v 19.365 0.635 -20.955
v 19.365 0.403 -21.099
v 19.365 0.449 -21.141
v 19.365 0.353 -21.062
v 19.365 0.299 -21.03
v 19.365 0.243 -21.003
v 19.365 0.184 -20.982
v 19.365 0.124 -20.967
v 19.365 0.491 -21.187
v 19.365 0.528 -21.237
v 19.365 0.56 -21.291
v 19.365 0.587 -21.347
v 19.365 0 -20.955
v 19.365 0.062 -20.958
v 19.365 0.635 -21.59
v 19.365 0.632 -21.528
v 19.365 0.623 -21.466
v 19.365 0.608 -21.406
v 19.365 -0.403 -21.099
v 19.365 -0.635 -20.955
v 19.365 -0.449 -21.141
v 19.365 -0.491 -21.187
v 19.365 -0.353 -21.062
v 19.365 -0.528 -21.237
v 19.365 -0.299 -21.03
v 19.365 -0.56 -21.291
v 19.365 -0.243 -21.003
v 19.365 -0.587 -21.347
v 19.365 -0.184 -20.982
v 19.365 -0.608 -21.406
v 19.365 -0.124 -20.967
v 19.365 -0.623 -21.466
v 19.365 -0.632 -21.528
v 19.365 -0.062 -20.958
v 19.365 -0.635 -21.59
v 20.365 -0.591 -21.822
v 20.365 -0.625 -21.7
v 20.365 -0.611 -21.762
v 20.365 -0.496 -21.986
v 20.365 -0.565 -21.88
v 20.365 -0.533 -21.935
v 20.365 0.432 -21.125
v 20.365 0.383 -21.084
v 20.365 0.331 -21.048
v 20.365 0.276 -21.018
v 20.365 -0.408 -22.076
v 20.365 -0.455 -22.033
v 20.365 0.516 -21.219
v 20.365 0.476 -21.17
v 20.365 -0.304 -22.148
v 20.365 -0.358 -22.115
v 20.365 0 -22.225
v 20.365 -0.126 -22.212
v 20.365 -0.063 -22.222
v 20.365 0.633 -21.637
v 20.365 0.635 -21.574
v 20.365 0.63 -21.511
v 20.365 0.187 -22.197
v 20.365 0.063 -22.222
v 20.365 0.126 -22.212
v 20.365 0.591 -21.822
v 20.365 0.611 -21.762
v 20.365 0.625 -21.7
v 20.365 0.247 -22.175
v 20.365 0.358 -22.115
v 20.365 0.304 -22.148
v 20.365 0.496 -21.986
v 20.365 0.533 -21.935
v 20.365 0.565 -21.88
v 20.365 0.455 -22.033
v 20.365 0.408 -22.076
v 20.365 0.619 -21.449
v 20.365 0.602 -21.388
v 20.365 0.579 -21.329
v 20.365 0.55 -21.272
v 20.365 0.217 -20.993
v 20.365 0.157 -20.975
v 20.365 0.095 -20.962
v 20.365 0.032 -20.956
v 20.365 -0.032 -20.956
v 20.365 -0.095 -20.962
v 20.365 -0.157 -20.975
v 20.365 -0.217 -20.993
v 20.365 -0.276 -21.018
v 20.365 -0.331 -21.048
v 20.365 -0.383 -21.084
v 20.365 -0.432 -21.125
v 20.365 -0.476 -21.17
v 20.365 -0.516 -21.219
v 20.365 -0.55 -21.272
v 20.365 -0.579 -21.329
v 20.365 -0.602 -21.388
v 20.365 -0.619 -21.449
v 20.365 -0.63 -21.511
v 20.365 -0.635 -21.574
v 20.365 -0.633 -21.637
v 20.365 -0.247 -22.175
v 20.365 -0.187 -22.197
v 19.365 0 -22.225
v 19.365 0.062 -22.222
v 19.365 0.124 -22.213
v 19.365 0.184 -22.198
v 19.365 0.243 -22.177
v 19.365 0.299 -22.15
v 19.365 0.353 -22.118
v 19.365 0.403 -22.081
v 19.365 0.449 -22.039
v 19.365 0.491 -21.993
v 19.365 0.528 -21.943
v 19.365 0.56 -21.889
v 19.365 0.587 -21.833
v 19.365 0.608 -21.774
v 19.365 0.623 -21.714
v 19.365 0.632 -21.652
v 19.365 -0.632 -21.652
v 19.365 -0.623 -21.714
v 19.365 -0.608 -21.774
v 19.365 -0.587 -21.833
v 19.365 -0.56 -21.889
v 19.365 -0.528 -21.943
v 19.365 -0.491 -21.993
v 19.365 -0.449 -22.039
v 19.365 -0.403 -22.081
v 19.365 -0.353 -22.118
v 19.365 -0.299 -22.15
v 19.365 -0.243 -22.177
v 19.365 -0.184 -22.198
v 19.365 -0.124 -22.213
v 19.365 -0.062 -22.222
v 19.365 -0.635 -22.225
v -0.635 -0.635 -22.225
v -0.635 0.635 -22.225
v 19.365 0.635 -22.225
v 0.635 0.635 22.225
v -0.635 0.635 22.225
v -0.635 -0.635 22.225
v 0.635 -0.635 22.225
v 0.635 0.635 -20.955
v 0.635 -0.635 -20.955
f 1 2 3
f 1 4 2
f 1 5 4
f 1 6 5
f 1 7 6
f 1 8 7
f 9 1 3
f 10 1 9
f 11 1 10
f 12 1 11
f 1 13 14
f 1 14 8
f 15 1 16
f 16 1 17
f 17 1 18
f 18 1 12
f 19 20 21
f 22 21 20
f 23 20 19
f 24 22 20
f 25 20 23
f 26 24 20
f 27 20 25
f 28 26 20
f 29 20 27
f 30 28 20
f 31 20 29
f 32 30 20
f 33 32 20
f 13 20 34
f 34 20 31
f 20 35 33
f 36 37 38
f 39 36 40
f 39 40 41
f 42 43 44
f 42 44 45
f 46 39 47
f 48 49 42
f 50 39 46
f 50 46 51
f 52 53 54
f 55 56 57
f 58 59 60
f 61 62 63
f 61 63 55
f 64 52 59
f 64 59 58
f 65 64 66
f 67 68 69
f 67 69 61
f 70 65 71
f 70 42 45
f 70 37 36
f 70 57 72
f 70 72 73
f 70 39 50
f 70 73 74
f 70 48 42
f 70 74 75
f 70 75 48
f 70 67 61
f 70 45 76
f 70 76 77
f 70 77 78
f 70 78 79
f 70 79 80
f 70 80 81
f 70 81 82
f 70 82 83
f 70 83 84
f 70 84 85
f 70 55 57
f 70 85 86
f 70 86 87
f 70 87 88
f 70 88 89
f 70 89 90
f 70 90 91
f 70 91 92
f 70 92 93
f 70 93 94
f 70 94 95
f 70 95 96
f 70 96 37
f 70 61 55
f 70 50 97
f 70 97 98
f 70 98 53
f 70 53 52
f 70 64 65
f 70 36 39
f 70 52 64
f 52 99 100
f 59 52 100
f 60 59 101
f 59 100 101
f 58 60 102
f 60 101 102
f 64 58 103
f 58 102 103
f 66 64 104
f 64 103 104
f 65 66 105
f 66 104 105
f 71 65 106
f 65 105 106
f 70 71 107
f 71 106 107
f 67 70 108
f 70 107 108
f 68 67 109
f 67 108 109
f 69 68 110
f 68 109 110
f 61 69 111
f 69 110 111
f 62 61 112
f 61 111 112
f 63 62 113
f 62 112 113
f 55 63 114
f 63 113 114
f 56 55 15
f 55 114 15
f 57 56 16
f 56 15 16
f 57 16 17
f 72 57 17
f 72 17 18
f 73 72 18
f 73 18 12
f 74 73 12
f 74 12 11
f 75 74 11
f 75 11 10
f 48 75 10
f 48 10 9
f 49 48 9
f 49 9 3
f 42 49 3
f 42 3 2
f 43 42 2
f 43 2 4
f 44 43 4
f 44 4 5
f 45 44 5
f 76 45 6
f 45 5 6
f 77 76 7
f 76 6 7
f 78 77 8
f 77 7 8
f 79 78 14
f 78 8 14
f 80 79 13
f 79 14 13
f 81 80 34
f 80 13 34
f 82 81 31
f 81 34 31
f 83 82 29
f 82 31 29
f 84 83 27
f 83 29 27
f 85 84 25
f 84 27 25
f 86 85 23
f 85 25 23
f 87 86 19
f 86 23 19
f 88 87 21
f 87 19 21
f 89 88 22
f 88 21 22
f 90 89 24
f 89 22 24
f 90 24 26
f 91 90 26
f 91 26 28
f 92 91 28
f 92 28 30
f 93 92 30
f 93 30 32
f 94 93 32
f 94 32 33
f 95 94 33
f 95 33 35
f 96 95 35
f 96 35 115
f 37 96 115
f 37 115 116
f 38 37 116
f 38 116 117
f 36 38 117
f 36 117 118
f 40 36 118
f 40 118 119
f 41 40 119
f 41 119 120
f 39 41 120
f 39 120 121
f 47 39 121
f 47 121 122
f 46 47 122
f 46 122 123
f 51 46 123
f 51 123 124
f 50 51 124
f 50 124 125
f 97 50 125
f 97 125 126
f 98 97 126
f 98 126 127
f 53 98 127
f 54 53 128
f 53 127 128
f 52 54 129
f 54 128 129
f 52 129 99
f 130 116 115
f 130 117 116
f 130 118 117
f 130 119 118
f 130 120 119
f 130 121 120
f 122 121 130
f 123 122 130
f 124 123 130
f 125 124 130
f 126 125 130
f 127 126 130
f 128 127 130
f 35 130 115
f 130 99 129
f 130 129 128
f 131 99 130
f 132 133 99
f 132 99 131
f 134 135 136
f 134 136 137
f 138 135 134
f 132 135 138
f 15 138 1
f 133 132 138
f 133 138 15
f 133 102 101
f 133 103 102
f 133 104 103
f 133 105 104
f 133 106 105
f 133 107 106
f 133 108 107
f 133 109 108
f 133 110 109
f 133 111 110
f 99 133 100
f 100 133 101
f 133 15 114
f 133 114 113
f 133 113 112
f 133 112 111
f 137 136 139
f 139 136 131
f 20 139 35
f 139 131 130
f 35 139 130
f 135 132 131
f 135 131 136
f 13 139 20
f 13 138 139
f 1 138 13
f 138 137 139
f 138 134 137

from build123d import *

# Parameters (mm, degrees)
SKETCH1_W           = 18.73
SKETCH1_H           = 1.27
SKETCH1_W_2         = 1.27
SKETCH1_H_2         = 43.18
BOSS_EXTRUDE1_DEPTH = 0.635
SKETCH2_R           = 0.635
BOSS_EXTRUDE2_DEPTH = 1


with BuildPart() as part:
    # Sketch1 → Boss-Extrude1 (new body, symmetric)
    with BuildSketch(Plane(origin=(0, 0, 0), x_dir=(1, 0, 0), z_dir=(0, 1, 0))):
        with Locations((10, 21.59)):
            Rectangle(SKETCH1_W, SKETCH1_H)
        with Locations((0, 21.59)):
            Rectangle(SKETCH1_W_2, SKETCH1_H)
        with Locations((0, -0.635)):
            Rectangle(SKETCH1_W_2, SKETCH1_H_2)
    extrude(amount=BOSS_EXTRUDE1_DEPTH, both=True)

    # Sketch2 → Boss-Extrude2 (add)
    with BuildSketch(Plane(origin=(19.365, 0, 0), x_dir=(0, 0, -1), z_dir=(1, 0, 0))):
        with Locations((21.59, 0)):
            Circle(SKETCH2_R)
    extrude(amount=BOSS_EXTRUDE2_DEPTH)


solid = part.part
